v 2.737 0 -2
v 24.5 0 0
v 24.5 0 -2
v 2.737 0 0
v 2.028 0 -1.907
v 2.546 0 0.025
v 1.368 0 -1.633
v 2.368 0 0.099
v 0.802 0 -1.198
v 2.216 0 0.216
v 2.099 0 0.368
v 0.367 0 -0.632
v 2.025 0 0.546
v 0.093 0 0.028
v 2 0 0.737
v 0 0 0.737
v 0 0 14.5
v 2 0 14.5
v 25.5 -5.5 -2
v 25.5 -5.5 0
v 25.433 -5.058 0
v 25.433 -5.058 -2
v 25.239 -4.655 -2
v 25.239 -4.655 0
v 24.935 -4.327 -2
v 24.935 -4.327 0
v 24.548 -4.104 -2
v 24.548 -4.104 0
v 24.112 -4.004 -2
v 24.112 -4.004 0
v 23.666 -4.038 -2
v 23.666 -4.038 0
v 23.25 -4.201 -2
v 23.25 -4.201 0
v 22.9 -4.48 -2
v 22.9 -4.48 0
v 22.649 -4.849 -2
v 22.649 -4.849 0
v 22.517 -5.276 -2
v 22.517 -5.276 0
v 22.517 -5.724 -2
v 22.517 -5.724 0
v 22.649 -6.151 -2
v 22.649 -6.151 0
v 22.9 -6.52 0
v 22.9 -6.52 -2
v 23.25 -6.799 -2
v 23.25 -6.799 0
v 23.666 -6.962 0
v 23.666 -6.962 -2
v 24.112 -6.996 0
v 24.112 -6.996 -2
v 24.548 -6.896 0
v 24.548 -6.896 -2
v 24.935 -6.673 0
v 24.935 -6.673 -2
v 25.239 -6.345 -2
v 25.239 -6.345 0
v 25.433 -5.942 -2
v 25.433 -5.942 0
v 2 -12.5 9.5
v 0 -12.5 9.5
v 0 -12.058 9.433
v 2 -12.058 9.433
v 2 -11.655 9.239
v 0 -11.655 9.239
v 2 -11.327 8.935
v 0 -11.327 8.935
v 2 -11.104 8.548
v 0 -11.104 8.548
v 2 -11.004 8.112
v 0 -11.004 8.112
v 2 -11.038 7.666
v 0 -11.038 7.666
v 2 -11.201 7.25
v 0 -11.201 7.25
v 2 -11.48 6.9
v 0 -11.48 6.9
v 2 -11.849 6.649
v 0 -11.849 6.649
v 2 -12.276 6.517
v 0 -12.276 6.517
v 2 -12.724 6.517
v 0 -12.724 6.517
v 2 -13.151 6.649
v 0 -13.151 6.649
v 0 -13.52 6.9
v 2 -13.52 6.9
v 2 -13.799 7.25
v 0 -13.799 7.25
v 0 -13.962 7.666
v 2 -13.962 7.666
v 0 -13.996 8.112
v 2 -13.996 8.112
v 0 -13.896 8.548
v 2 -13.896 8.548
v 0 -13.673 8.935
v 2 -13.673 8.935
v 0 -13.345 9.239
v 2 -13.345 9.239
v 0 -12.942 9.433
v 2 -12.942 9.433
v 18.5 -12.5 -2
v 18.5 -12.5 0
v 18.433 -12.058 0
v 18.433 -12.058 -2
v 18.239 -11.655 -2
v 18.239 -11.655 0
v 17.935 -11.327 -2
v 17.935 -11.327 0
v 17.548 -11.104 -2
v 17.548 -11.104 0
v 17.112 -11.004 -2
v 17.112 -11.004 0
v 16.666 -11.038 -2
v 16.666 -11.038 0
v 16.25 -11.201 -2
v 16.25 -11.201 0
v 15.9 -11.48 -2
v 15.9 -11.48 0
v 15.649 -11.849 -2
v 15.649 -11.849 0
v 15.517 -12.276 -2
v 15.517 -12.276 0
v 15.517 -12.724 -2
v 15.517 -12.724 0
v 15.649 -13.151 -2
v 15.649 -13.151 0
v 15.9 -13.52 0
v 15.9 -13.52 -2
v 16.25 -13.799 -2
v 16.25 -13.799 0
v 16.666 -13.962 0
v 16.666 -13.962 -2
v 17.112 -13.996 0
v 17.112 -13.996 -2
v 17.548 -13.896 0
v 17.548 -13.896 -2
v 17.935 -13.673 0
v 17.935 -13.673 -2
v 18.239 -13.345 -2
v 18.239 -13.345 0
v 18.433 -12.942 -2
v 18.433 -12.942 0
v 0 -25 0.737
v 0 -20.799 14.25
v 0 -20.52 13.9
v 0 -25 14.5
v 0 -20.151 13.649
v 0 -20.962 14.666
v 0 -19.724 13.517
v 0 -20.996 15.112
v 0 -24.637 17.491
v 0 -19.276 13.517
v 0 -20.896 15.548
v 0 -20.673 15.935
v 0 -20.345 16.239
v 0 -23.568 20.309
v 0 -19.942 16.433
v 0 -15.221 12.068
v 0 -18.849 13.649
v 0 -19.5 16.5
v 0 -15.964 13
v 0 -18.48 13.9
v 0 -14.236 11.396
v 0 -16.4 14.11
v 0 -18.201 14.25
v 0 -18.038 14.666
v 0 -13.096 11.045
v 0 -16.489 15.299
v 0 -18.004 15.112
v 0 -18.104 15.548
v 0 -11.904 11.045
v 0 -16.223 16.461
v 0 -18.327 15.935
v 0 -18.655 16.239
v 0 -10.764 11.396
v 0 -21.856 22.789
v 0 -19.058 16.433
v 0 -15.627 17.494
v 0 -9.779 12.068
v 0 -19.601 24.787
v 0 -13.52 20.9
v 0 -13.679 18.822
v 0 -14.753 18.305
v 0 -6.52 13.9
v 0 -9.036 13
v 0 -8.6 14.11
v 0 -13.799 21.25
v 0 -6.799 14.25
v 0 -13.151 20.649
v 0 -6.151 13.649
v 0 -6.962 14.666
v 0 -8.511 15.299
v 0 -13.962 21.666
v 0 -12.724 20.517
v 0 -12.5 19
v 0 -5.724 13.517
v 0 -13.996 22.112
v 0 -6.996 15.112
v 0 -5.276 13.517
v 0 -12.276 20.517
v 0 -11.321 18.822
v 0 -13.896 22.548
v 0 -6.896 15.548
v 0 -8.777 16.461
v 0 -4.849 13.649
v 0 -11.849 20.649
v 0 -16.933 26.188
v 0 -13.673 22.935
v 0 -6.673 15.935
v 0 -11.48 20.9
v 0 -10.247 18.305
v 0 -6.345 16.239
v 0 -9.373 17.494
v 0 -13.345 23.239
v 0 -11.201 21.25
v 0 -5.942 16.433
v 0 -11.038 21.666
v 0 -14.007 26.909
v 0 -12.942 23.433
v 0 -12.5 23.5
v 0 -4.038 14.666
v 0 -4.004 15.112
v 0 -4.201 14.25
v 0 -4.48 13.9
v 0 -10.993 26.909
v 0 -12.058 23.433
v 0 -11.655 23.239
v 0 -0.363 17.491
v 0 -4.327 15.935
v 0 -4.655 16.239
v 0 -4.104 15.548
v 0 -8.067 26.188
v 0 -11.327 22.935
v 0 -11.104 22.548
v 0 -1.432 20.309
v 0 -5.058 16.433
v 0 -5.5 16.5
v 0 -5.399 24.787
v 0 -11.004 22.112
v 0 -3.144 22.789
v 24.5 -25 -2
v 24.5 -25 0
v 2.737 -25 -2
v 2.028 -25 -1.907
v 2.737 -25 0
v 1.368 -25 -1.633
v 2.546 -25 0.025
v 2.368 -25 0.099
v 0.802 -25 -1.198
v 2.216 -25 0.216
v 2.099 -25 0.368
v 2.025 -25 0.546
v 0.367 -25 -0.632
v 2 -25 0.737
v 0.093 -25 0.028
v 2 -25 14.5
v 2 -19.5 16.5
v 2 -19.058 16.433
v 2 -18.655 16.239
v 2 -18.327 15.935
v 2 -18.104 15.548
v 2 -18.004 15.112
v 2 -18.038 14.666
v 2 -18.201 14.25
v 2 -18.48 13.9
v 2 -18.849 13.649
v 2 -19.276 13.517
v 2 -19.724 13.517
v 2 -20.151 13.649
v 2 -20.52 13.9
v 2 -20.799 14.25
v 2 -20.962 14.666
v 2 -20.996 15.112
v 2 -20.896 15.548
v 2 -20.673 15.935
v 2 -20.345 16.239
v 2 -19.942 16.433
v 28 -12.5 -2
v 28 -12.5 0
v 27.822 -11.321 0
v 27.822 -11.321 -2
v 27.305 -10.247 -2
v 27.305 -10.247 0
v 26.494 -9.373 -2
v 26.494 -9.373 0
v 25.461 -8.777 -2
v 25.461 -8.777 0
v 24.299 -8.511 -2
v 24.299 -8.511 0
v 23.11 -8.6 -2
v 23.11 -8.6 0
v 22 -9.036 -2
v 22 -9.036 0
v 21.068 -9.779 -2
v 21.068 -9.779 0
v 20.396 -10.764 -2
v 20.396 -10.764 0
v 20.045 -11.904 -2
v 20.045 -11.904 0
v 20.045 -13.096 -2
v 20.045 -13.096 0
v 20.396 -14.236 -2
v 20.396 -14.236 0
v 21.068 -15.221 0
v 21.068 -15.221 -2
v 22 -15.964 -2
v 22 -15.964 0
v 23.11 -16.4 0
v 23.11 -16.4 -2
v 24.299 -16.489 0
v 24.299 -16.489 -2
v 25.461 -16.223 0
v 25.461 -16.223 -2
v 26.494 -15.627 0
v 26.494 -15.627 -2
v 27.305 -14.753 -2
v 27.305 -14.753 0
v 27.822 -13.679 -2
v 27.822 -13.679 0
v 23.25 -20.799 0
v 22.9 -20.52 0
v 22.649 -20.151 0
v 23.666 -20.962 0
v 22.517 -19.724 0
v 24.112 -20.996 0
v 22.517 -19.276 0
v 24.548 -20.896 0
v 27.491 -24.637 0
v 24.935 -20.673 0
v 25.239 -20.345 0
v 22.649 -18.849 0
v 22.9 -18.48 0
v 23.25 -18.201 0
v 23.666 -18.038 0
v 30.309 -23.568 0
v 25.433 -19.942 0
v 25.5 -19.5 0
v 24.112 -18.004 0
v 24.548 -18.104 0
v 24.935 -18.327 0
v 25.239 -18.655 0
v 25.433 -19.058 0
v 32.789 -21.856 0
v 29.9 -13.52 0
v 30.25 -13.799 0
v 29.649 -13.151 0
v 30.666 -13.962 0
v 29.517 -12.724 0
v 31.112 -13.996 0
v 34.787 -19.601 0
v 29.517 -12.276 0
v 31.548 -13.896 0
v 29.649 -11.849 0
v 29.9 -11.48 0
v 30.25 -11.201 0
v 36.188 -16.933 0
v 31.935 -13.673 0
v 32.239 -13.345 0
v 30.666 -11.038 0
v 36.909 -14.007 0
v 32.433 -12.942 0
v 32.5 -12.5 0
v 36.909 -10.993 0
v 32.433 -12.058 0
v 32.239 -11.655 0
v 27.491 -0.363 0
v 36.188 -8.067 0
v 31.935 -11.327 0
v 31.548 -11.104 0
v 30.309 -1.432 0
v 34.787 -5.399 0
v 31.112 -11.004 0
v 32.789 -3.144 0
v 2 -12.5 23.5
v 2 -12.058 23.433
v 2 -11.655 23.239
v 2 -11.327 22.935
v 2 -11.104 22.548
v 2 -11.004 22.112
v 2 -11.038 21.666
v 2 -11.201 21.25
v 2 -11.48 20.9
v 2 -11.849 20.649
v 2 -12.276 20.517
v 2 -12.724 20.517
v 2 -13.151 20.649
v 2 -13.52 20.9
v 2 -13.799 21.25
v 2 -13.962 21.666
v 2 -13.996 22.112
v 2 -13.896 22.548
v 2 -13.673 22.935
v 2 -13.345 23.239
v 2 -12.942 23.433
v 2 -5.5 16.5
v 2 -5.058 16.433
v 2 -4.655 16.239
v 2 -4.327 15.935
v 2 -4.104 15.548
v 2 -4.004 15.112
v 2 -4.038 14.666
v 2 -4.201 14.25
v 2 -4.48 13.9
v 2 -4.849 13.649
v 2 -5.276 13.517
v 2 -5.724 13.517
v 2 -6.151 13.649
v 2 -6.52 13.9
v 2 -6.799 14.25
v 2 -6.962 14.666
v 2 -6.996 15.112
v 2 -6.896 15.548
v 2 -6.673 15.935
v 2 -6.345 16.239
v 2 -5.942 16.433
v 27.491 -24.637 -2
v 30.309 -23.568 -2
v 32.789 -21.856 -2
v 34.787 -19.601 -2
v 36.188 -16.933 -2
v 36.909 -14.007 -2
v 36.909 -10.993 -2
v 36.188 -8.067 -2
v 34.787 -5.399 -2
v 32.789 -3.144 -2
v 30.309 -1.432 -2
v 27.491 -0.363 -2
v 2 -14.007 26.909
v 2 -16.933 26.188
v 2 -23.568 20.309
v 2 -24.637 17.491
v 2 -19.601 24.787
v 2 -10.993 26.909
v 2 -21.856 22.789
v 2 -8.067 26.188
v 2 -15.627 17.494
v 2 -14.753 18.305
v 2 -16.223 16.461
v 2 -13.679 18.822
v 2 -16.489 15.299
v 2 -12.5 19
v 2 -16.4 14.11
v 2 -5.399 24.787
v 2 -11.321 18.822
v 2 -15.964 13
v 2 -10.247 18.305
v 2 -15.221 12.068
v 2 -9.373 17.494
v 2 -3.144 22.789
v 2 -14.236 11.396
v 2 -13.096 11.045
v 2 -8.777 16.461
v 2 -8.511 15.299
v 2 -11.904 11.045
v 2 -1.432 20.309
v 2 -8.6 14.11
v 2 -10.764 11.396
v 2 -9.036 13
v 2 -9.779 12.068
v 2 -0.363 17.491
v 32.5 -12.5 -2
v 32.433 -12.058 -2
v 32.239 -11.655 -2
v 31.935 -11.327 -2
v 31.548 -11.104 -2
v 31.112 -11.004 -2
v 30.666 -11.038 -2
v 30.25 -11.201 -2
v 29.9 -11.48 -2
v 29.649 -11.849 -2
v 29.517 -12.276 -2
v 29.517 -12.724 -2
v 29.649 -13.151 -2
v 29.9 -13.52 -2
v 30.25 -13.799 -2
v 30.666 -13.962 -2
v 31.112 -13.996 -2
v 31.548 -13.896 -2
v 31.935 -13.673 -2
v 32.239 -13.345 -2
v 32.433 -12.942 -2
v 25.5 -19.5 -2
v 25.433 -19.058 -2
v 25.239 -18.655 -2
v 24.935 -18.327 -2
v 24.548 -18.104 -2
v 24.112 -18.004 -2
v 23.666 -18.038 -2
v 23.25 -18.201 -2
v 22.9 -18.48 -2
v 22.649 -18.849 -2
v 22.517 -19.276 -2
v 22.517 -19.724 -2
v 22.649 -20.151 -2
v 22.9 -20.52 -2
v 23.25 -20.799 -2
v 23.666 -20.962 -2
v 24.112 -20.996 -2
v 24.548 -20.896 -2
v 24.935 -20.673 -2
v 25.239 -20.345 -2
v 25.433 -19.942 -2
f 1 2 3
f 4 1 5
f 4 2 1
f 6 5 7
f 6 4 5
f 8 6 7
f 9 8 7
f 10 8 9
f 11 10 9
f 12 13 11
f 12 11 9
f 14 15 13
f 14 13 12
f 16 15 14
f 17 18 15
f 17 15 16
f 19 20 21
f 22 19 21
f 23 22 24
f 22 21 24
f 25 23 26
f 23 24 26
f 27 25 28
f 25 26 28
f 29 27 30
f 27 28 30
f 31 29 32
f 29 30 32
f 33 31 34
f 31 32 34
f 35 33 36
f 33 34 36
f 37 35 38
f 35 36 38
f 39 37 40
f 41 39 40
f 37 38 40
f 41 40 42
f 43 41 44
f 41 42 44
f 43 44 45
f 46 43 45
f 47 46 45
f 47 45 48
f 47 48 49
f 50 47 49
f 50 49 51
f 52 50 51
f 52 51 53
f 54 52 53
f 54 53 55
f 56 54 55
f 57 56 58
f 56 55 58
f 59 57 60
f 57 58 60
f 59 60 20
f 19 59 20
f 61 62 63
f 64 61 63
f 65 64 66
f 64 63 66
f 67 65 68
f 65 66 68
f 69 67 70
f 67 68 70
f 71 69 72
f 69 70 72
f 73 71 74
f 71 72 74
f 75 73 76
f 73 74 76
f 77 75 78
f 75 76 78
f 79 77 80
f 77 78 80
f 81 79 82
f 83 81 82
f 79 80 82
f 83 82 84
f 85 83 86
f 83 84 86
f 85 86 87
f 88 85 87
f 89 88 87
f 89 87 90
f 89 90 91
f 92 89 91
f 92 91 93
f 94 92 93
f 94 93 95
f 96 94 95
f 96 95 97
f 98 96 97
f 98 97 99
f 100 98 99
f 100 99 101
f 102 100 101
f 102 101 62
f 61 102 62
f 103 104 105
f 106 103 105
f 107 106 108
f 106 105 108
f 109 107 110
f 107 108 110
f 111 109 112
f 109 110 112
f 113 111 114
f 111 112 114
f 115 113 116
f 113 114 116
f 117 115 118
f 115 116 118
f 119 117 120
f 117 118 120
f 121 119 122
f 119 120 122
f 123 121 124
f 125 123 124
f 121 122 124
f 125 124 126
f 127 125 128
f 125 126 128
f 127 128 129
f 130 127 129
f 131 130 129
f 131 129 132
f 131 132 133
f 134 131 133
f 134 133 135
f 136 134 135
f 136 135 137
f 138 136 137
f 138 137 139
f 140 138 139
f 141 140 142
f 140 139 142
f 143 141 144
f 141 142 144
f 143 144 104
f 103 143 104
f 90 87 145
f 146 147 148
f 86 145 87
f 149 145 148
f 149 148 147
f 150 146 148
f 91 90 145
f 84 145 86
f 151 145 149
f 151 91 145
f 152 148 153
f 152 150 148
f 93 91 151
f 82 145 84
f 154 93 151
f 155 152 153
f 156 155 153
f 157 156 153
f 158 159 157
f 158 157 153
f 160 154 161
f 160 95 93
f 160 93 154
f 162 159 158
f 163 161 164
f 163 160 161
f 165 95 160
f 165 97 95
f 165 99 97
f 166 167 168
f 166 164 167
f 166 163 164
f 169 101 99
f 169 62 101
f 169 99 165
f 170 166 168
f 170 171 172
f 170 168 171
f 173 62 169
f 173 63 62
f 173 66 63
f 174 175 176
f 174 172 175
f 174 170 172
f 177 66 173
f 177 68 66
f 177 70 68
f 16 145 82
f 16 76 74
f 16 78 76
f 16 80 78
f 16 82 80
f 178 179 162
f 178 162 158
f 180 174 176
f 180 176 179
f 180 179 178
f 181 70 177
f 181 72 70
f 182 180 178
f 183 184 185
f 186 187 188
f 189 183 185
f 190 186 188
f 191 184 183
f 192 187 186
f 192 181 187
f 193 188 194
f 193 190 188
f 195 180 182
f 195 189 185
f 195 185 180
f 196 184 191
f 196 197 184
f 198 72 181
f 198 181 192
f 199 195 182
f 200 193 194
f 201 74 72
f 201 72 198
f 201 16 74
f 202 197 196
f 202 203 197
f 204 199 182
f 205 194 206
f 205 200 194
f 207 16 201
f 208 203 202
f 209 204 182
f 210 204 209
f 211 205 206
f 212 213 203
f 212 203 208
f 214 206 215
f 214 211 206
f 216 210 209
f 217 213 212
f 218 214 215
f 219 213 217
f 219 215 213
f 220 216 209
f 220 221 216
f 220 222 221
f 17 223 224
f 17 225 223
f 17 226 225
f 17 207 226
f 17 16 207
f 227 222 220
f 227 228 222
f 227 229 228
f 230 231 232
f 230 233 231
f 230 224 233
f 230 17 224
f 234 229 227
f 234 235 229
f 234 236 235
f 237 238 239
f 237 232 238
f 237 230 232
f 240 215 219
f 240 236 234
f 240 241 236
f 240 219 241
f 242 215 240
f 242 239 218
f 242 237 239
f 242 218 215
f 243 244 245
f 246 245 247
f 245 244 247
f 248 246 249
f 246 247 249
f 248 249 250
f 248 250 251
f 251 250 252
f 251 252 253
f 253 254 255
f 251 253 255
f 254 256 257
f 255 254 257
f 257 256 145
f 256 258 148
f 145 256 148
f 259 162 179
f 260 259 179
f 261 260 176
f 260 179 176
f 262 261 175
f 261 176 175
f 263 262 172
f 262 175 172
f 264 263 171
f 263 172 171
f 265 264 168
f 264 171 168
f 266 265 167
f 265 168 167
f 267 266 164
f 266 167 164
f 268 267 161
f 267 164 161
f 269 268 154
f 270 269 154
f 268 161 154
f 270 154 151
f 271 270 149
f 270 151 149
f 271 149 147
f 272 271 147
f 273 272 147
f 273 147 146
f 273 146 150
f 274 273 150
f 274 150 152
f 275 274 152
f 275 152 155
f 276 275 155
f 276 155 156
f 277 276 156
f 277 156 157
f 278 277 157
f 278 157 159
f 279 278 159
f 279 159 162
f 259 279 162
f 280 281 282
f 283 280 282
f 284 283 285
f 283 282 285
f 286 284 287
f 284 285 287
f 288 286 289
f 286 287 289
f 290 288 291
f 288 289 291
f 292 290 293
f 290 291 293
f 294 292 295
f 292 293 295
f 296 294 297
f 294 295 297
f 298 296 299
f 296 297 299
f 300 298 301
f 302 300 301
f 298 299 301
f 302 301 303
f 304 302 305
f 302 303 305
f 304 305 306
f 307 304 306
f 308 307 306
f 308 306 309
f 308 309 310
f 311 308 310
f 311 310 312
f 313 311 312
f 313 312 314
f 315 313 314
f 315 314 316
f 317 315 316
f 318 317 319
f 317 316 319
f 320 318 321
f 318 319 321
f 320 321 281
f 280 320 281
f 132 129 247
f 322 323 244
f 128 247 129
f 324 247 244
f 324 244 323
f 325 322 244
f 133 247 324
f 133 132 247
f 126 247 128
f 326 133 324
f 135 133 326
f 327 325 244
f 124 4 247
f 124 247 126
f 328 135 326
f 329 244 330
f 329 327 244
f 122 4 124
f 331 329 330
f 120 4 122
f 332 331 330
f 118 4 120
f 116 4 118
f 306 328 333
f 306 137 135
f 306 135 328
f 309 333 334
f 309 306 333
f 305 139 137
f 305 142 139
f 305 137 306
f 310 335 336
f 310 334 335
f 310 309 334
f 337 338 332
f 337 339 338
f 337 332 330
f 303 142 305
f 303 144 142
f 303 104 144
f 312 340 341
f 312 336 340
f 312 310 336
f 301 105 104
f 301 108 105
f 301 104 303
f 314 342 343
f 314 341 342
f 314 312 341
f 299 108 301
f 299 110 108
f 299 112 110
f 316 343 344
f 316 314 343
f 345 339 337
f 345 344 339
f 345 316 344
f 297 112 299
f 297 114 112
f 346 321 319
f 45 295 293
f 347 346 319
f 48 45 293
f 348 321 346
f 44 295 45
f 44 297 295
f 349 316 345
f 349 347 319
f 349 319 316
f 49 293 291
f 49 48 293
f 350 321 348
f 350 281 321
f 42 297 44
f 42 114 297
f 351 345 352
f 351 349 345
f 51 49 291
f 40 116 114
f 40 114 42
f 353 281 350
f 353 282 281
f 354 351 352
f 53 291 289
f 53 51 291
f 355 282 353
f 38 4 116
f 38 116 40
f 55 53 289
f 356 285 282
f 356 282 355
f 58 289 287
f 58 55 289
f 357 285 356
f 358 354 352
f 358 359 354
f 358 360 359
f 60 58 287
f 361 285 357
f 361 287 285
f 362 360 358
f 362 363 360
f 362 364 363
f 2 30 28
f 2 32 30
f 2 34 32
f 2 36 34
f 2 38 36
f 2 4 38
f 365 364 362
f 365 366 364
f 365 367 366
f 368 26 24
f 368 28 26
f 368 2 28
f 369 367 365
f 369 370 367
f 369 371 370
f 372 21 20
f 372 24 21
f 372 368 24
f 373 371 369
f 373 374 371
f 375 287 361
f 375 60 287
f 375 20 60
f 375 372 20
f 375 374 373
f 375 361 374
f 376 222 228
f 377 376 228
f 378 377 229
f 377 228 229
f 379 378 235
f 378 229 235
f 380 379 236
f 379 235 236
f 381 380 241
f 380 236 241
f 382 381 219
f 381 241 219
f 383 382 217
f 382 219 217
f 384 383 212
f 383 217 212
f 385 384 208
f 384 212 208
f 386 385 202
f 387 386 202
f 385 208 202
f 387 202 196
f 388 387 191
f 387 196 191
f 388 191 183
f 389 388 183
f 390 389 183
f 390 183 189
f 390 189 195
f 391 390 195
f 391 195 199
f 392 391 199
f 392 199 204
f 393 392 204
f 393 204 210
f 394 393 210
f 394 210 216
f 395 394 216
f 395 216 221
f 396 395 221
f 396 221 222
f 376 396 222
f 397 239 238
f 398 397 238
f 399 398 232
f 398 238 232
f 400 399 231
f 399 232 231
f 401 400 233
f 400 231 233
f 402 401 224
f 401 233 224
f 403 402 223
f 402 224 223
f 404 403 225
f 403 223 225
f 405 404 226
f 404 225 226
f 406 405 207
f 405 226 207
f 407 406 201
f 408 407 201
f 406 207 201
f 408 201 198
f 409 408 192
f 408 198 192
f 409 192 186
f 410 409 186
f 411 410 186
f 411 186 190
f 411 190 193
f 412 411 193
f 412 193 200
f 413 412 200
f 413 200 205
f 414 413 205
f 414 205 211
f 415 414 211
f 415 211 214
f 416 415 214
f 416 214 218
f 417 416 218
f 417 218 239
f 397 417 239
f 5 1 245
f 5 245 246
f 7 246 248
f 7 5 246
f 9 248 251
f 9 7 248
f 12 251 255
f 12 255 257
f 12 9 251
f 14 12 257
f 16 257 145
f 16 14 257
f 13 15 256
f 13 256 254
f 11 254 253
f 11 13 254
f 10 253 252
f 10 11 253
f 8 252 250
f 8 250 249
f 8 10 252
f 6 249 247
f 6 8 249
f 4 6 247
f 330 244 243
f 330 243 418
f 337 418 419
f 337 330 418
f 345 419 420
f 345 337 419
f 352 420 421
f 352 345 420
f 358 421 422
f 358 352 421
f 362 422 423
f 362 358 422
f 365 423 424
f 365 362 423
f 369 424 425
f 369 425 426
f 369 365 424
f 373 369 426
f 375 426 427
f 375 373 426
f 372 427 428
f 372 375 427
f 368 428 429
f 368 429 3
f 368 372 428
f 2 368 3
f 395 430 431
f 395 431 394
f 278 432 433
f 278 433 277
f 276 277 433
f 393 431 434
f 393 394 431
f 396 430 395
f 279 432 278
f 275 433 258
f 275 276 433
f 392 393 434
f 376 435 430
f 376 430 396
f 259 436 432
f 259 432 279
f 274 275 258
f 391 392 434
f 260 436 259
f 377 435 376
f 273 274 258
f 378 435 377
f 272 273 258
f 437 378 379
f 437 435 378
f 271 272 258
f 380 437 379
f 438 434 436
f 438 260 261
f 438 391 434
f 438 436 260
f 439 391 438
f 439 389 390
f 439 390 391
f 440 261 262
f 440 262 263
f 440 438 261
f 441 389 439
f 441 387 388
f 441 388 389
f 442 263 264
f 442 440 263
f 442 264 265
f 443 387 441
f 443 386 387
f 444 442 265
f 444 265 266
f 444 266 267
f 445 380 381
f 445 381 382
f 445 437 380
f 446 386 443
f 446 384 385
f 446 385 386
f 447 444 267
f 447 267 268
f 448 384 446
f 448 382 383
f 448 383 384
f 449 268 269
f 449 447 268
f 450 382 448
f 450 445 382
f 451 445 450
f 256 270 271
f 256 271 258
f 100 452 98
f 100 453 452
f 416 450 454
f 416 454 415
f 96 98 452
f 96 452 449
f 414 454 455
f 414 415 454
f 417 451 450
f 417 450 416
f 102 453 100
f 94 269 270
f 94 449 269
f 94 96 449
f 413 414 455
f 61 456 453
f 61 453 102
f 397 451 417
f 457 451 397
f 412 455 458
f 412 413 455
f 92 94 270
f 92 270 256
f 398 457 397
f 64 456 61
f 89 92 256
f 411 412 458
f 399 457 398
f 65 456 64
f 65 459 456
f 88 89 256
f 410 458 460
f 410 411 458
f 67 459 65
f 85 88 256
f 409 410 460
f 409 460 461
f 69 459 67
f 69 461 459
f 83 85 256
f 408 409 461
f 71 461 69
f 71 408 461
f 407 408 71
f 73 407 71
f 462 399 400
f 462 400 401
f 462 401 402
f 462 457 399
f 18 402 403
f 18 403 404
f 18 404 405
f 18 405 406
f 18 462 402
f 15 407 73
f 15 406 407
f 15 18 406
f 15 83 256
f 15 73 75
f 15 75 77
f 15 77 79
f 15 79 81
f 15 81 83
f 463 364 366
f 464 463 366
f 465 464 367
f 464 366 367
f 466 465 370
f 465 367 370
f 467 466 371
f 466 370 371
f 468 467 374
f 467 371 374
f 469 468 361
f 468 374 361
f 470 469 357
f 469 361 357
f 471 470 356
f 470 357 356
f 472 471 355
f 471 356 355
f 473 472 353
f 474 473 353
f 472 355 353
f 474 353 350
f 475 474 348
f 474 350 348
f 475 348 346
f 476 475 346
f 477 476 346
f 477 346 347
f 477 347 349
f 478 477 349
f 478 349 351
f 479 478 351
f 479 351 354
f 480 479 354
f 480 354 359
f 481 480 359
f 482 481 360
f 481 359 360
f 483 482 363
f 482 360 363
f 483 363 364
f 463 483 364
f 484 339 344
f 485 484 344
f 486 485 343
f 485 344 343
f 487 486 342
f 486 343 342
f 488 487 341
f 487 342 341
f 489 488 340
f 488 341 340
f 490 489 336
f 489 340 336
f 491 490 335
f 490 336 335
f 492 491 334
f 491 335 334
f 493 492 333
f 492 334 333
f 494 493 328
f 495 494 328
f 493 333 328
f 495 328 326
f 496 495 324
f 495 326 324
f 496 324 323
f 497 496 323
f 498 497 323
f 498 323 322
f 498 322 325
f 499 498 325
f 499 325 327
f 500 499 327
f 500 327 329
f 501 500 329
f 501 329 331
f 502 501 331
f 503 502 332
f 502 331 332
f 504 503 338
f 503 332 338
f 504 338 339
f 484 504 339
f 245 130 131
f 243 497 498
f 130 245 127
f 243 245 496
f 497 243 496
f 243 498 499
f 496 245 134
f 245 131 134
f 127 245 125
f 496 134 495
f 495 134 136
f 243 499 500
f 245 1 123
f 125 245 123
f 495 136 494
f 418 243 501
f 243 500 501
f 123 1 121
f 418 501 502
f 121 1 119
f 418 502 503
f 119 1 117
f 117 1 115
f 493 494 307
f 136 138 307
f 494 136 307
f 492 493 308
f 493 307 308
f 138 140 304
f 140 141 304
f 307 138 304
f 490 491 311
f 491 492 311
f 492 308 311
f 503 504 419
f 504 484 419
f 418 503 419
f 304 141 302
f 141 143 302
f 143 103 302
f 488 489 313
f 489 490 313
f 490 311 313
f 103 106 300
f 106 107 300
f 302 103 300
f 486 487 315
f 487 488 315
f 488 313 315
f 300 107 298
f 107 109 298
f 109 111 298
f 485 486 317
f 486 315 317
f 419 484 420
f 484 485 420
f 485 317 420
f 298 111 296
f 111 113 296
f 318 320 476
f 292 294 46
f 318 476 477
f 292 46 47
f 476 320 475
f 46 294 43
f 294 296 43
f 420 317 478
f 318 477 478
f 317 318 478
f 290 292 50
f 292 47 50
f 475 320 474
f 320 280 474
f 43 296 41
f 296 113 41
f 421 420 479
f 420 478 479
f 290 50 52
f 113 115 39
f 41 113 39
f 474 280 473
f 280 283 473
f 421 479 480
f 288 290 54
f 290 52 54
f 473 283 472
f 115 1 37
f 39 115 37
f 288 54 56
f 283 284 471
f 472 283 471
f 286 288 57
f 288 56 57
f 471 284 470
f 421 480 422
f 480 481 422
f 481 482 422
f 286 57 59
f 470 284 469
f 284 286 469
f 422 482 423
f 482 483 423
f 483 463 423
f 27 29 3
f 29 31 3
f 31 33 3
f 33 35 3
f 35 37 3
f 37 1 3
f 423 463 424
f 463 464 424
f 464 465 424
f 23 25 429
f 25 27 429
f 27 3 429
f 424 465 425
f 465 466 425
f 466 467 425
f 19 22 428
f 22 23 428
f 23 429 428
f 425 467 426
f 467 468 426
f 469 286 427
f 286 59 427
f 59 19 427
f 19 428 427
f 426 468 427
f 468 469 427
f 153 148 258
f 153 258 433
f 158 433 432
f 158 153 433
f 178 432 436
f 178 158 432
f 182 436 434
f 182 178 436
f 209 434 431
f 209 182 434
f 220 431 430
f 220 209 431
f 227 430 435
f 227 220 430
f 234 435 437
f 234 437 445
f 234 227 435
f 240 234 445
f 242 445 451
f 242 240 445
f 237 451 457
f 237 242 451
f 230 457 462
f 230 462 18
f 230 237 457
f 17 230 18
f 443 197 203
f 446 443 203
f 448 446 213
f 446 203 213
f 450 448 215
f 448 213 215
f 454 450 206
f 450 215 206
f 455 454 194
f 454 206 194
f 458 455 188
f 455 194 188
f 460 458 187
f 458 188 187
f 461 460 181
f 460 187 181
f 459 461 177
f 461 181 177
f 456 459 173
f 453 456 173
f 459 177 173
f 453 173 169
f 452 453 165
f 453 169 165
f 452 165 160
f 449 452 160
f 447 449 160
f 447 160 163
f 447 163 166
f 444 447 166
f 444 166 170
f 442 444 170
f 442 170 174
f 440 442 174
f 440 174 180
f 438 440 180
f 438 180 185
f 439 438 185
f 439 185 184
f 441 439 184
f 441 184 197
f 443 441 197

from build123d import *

# Parameters (mm, degrees)
SKETCH_1_R                       = 4
SKETCH_1_R_2                     = 1.5
SM_BASE_FLANGE_1_DEPTH           = 2
SM_EDGE_FLANGE_1_STRIP_W         = 9.4732
SM_EDGE_FLANGE_1_STRIP_H         = 2
SM_EDGE_FLANGE_1_STRIP_CUT_DEPTH = 25
SM_EDGE_FLANGE_1_DEPTH           = 25
SKETCH_9_R                       = 4
SKETCH_9_R_2                     = 1.5
CUT_EXTRUDE_1_DEPTH              = 10


# Sheet-metal steps are written as plain solids
with BuildPart() as part:
    # Sketch 1 → 基体-法兰1 (new body)
    with BuildSketch(Plane.XY):
        with BuildLine():
            Line((0, 0), (0, -25))
            Line((0, -25), (24.5, -25))
            ThreePointArc((24.5, -25), (37, -12.5), (24.5, 0))
            Line((24.5, 0), (0, 0))
        make_face()
        with Locations((24, -12.5)):
            Circle(SKETCH_1_R, mode=Mode.SUBTRACT)
        with Locations((17, -12.5)):
            Circle(SKETCH_1_R_2, mode=Mode.SUBTRACT)
        with Locations((31, -12.5)):
            Circle(SKETCH_1_R_2, mode=Mode.SUBTRACT)
        with Locations((24, -19.5)):
            Circle(SKETCH_1_R_2, mode=Mode.SUBTRACT)
        with Locations((24, -5.5)):
            Circle(SKETCH_1_R_2, mode=Mode.SUBTRACT)
    extrude(amount=-SM_BASE_FLANGE_1_DEPTH)

    # 边线-法兰1 strip (across the edge) → 边线-法兰1 strip cut (cut)
    with BuildSketch(Plane.XZ):
        with Locations((-2, -1)):
            Rectangle(SM_EDGE_FLANGE_1_STRIP_W, SM_EDGE_FLANGE_1_STRIP_H)
    extrude(amount=SM_EDGE_FLANGE_1_STRIP_CUT_DEPTH, mode=Mode.SUBTRACT)

    # 边线-法兰1 section (across the edge) → 边线-法兰1 (add)
    with BuildSketch(Plane.XZ):
        with BuildLine():
            Line((0, 0.7366), (0, 28))
            Line((0, 28), (2, 28))
            Line((2, 28), (2, 0.7366))
            ThreePointArc((2, 0.7366), (2.215745145, 0.215745145), (2.7366, 0))
            Line((2.7366, 0), (2.7366, -2))
            ThreePointArc((2.7366, -2), (0.801531583, -1.198468417), (0, 0.7366))
        make_face()
    extrude(amount=SM_EDGE_FLANGE_1_DEPTH)

    # 草图9 → 切除-拉伸1 (cut)
    with BuildSketch(Plane.ZY):
        with Locations((15, -12.5)):
            Circle(SKETCH_9_R)
        with Locations((22, -12.5)):
            Circle(SKETCH_9_R_2)
        with Locations((8, -12.5)):
            Circle(SKETCH_9_R_2)
        with Locations((15, -19.5)):
            Circle(SKETCH_9_R_2)
        with Locations((15, -5.5)):
            Circle(SKETCH_9_R_2)
        with BuildLine():
            Line((14.5, 0), (28, 0))
            Line((28, 0), (28, -25))
            Line((28, -25), (14.5, -25))
            ThreePointArc((14.5, -25), (27, -12.5), (14.5, 0))
        make_face()
    extrude(amount=-CUT_EXTRUDE_1_DEPTH, mode=Mode.SUBTRACT)


solid = part.part
